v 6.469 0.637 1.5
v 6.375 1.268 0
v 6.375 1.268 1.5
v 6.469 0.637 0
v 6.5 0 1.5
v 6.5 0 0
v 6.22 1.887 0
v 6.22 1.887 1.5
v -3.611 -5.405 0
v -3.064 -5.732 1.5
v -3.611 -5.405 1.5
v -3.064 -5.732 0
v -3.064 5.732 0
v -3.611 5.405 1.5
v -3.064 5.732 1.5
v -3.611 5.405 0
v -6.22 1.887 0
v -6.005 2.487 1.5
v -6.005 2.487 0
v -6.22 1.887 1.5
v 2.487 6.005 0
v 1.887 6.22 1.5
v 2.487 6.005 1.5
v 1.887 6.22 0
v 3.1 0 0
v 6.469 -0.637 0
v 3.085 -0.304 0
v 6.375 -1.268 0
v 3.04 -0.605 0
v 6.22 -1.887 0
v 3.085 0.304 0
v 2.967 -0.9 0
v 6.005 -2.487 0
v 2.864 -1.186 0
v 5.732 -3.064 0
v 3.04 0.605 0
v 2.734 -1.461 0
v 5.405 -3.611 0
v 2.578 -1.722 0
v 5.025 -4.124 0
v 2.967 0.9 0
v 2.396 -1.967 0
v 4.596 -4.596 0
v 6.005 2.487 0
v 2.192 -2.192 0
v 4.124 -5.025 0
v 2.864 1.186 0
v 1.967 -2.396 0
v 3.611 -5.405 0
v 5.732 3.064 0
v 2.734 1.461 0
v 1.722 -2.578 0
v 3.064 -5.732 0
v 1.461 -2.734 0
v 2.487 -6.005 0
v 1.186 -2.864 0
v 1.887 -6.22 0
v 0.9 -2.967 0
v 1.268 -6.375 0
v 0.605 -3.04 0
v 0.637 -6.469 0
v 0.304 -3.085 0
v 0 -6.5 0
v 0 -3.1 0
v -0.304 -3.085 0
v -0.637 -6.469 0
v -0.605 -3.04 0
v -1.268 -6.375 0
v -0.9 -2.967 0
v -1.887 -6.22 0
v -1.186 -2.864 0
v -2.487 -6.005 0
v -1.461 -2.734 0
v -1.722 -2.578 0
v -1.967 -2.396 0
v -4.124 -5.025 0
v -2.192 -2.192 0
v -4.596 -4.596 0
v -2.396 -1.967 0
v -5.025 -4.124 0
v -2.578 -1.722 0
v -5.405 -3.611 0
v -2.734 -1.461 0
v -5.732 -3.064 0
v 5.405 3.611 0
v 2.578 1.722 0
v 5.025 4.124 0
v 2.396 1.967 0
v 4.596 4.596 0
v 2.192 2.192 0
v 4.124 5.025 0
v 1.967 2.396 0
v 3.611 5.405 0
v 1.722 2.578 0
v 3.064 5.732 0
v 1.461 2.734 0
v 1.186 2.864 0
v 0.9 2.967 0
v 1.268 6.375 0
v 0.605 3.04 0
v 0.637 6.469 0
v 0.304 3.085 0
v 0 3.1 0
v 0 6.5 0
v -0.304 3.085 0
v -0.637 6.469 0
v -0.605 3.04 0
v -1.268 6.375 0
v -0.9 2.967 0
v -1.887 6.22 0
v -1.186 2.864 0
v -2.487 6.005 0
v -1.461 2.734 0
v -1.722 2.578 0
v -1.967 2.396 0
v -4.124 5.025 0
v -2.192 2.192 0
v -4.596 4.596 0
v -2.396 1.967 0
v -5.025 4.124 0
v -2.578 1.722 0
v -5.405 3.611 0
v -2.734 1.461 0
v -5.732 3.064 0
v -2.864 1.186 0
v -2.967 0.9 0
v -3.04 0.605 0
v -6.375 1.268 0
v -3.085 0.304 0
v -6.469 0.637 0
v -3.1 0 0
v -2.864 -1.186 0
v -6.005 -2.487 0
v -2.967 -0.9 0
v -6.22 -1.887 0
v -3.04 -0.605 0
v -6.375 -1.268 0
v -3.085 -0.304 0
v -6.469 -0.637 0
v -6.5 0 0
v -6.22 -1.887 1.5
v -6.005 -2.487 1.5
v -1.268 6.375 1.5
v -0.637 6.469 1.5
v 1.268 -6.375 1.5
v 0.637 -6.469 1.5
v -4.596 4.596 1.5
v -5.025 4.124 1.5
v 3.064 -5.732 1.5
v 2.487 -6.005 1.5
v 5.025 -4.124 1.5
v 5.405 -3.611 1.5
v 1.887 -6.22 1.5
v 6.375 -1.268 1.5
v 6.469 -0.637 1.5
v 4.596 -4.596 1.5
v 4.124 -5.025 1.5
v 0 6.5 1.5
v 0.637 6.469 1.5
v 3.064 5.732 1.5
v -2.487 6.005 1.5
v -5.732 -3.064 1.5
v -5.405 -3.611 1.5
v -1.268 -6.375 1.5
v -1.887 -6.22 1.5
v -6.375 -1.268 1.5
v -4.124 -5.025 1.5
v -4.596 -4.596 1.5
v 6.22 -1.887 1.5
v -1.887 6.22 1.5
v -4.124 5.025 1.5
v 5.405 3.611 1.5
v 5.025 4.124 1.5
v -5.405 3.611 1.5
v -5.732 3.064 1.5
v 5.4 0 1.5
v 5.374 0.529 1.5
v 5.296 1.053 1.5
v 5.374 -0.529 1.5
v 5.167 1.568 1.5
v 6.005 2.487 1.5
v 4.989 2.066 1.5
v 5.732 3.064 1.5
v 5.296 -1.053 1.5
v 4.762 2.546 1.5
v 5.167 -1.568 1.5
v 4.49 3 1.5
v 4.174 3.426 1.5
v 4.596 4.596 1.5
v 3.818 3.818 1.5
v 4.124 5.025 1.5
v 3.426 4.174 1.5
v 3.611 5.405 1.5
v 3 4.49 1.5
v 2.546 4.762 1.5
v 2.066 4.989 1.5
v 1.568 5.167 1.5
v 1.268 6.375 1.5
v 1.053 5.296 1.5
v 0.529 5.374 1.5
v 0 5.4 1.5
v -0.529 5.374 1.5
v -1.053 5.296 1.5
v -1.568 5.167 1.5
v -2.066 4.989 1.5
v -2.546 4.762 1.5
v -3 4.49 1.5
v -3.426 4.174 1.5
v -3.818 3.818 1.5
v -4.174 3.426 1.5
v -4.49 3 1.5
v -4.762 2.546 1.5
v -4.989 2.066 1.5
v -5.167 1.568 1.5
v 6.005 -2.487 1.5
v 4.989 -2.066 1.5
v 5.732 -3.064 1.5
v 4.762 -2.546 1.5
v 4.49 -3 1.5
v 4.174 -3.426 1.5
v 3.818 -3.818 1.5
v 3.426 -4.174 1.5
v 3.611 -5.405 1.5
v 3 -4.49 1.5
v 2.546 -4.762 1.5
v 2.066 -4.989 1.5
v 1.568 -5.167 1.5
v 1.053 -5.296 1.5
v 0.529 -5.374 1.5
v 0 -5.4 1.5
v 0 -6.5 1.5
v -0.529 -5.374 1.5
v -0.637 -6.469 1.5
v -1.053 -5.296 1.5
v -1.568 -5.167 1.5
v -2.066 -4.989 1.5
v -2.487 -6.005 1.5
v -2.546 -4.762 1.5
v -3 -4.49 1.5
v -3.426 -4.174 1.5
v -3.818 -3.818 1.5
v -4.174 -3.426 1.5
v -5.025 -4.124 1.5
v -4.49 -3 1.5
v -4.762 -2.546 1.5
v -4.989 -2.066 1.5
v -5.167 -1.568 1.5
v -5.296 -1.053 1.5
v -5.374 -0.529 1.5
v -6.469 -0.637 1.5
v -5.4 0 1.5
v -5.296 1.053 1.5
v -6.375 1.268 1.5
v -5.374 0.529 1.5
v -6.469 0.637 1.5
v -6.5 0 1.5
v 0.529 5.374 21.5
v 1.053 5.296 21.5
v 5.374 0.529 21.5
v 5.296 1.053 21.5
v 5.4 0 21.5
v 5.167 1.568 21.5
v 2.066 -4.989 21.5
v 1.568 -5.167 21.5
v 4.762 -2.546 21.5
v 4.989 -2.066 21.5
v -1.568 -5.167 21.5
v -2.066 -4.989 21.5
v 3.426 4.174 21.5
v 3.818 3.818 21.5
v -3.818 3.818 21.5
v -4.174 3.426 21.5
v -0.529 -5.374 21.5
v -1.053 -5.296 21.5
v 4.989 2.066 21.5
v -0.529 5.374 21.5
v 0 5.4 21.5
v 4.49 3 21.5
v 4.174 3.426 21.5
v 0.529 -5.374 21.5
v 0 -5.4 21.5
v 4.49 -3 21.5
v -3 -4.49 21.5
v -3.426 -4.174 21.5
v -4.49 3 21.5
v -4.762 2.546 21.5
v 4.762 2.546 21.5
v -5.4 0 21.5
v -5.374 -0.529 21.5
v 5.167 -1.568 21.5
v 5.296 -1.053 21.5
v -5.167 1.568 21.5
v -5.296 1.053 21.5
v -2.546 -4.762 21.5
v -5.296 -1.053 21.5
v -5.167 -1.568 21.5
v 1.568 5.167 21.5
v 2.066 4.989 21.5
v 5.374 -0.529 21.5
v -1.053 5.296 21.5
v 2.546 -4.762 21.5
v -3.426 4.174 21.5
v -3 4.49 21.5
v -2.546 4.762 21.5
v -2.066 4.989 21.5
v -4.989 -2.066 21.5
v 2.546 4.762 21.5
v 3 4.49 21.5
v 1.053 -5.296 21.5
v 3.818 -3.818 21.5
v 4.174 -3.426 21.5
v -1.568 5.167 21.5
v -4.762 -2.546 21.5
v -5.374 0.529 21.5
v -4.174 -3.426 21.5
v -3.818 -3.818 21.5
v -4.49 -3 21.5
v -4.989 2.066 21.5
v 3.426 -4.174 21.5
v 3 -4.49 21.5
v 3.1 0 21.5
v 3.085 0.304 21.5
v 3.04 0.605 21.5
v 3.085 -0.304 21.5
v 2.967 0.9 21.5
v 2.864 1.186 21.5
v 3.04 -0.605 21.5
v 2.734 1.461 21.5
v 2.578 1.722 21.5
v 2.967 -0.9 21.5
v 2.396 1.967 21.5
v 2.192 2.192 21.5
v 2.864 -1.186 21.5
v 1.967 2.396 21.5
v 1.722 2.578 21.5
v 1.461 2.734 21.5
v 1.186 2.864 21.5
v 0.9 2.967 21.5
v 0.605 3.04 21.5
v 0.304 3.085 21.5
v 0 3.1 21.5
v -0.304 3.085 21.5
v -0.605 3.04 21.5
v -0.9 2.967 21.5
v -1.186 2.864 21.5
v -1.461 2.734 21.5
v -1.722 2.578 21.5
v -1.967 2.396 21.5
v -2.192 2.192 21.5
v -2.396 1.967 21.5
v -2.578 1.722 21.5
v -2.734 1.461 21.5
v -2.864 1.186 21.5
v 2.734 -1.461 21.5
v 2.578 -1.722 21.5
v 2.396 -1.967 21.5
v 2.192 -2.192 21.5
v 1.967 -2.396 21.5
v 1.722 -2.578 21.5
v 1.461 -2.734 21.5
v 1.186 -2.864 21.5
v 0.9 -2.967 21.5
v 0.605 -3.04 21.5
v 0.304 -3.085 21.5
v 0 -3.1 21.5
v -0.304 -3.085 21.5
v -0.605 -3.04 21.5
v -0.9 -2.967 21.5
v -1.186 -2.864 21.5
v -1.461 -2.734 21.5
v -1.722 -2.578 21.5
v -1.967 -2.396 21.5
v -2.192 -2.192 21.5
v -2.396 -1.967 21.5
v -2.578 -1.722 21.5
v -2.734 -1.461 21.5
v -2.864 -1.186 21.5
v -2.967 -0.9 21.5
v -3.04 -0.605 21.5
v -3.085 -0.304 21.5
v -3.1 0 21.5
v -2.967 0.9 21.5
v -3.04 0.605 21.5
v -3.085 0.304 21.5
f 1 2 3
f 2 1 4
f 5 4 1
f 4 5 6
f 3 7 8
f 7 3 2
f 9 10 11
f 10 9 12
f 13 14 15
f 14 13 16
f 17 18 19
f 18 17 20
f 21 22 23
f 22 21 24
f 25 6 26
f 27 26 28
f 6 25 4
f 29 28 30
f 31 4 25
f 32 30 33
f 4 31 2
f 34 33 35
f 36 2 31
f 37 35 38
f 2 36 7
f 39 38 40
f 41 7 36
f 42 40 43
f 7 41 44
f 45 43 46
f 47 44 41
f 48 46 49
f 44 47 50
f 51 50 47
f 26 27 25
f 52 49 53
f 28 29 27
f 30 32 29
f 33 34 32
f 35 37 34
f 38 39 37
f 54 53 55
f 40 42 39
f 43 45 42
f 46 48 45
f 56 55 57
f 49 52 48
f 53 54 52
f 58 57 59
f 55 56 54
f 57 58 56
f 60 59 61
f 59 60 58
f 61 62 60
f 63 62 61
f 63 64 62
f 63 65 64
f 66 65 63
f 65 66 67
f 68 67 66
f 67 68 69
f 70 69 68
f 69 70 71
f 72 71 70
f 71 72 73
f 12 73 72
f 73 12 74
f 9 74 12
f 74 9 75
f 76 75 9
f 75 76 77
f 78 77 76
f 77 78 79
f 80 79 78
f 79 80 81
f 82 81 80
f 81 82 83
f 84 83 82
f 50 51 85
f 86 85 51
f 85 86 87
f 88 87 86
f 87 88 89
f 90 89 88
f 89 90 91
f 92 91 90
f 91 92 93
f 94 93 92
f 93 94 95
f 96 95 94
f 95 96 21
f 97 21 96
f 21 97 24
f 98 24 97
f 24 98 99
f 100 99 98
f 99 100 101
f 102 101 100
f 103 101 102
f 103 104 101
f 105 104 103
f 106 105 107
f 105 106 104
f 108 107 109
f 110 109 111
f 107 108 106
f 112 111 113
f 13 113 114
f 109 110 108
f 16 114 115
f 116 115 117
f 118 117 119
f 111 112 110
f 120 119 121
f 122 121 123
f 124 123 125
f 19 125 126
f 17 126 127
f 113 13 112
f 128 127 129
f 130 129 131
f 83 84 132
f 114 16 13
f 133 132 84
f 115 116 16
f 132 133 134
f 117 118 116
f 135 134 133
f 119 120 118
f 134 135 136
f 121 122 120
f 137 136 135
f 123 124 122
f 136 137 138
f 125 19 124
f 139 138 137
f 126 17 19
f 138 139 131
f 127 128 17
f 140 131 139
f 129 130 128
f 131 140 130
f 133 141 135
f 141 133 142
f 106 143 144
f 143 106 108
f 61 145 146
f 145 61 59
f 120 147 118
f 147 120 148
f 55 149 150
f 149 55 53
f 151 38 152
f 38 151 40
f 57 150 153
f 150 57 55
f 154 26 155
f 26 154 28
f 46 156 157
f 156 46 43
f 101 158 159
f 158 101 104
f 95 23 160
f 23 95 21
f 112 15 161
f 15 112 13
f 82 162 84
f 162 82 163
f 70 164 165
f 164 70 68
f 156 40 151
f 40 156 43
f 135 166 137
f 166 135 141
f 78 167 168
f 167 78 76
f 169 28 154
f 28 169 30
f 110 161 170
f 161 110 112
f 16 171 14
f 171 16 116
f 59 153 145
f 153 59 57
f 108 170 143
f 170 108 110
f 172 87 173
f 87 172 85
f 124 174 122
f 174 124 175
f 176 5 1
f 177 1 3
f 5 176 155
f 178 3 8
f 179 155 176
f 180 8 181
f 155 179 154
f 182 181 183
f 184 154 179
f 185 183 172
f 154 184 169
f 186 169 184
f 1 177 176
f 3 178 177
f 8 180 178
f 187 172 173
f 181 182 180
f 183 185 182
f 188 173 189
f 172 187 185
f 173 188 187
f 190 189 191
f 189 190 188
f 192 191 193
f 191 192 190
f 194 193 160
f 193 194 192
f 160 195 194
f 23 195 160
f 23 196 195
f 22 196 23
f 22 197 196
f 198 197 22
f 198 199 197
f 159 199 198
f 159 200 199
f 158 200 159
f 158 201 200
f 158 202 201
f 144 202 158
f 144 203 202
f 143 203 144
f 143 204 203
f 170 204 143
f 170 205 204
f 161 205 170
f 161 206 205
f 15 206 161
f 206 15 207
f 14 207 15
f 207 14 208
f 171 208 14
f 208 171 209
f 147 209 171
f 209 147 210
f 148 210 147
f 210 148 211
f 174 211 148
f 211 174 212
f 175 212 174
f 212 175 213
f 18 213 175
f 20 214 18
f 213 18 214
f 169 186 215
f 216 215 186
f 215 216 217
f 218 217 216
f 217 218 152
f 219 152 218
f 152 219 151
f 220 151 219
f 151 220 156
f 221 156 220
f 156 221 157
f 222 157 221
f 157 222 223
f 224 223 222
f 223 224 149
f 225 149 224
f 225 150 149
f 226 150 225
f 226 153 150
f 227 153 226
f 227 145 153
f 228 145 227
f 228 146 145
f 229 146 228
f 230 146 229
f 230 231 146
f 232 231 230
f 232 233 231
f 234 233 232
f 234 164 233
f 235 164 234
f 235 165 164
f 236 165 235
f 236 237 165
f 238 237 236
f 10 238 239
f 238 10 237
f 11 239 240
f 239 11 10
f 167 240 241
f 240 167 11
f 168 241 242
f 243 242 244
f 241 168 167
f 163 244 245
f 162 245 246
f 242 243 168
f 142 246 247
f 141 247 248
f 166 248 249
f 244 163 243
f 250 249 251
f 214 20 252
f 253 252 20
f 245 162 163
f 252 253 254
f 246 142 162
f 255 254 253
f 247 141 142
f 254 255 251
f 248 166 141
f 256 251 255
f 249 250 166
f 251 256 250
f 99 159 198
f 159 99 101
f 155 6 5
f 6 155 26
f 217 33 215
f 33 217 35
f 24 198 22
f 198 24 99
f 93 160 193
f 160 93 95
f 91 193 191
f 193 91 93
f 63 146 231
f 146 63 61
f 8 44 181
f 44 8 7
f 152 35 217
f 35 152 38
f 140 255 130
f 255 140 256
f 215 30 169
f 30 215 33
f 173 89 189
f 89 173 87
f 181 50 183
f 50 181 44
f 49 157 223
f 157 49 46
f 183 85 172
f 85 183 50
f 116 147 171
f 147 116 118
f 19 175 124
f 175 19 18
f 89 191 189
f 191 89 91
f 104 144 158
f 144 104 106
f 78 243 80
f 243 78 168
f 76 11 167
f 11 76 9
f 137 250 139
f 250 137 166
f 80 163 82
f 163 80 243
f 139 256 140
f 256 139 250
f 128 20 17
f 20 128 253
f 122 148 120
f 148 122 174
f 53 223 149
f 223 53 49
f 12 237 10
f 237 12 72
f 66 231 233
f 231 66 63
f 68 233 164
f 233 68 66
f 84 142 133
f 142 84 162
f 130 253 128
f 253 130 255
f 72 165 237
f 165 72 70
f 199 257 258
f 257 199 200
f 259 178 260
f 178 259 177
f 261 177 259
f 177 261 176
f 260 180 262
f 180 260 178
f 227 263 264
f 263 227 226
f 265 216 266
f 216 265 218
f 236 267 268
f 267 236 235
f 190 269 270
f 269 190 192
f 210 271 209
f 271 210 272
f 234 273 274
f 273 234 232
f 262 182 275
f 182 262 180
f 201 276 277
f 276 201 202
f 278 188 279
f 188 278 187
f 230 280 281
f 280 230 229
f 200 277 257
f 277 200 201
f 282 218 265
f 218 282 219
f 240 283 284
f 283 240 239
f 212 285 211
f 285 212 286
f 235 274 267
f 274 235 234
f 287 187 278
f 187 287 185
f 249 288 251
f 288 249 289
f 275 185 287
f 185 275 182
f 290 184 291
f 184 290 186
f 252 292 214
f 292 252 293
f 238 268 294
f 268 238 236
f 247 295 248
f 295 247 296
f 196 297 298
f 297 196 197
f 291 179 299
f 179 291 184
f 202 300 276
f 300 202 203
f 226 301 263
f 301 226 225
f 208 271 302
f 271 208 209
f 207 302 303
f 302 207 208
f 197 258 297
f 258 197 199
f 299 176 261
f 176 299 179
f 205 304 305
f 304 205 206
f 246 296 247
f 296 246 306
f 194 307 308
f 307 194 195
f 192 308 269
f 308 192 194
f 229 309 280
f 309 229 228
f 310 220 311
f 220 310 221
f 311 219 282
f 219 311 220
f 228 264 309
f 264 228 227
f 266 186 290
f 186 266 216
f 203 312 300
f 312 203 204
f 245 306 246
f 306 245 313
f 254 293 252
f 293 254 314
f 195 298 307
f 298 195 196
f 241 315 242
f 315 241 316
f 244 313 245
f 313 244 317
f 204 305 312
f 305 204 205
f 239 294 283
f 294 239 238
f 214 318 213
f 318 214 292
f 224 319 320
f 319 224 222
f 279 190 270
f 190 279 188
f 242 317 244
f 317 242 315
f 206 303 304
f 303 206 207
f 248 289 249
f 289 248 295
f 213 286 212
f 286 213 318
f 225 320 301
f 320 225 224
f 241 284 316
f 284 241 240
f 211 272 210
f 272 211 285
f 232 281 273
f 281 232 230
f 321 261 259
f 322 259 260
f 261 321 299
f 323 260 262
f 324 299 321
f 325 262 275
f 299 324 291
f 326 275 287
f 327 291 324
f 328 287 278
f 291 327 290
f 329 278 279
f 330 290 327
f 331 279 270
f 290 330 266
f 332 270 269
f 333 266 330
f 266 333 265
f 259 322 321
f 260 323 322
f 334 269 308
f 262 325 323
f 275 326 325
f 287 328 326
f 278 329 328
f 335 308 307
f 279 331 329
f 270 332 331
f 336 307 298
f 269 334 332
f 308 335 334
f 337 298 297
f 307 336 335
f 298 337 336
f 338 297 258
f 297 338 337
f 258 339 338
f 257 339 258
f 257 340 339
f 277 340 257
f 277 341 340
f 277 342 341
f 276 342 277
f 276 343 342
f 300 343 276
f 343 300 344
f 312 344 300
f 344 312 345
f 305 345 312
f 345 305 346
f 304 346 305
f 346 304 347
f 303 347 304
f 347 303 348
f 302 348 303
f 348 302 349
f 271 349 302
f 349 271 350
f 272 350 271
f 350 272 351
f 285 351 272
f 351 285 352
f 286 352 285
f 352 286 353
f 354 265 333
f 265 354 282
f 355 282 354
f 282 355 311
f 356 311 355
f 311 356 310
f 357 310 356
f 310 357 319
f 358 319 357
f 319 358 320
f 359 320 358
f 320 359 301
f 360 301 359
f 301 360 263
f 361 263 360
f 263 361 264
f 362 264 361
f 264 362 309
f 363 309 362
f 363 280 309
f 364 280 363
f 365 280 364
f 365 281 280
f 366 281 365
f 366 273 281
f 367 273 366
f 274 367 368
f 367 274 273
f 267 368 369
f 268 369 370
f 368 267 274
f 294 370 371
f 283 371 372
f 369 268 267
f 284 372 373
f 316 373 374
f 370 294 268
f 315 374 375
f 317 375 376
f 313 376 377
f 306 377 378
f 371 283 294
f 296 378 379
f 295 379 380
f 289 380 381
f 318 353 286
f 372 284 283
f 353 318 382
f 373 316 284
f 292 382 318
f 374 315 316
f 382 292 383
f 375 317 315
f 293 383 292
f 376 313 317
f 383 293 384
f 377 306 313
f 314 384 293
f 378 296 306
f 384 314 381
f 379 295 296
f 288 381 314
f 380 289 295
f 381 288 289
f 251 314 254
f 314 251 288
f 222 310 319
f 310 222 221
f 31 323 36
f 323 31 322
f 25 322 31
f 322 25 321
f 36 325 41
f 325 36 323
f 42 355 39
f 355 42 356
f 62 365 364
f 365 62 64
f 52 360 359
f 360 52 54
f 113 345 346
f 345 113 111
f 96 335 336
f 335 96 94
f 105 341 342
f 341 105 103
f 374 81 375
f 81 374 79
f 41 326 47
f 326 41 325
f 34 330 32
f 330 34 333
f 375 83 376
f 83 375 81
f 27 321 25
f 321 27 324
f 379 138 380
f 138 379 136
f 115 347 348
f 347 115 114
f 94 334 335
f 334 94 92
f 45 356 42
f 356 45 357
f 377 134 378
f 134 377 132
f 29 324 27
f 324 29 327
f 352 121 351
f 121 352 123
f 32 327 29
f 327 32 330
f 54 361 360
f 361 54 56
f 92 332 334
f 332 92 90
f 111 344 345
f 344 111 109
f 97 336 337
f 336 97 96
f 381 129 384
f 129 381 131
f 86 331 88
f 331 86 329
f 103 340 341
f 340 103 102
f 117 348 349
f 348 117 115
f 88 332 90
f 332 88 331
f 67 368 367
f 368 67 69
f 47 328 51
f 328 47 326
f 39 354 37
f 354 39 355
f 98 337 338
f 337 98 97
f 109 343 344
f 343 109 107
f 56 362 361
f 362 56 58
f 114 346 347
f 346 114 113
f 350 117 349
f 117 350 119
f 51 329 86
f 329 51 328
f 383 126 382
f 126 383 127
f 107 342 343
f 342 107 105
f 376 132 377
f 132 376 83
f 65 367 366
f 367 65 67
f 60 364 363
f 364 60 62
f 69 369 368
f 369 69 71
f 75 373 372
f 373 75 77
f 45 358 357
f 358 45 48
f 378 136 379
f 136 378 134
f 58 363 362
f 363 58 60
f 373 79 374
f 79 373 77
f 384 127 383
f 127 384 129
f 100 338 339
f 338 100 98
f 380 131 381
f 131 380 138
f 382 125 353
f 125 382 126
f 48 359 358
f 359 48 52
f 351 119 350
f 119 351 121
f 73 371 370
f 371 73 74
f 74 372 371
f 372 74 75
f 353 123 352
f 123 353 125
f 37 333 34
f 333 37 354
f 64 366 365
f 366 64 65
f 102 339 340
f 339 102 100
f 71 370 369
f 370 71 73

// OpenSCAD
// Adapter sleeve: 0.2 mL PCR tube in a 1.5 mL rack hole
// Print orientation: collar down on the bed (z = 0), sleeve up (+Z)

$fn = 64;

// ---- Dimensions (mm) ----
collar_d      = 13;    // collar diameter (base contact with rack)
collar_h      = 1.5;   // collar thickness
sleeve_od     = 10.8;  // sleeve outer diameter
sleeve_top_z  = 21.5;  // height of sleeve top above bed
bore_d        = 6.2;   // through-bore diameter (tube seat)
eps           = 0.5;   // cutter overshoot past faces

// ---- Model ----
difference() {
    union() {
        // Base collar
        cylinder(d = collar_d, h = collar_h);
        // Sleeve body, overlapping slightly into collar for a clean union
        translate([0, 0, collar_h - 0.01])
            cylinder(d = sleeve_od, h = sleeve_top_z - collar_h + 0.01);
    }
    // Full-height bore, open at both ends
    translate([0, 0, -eps])
        cylinder(d = bore_d, h = sleeve_top_z + 2 * eps);
}
